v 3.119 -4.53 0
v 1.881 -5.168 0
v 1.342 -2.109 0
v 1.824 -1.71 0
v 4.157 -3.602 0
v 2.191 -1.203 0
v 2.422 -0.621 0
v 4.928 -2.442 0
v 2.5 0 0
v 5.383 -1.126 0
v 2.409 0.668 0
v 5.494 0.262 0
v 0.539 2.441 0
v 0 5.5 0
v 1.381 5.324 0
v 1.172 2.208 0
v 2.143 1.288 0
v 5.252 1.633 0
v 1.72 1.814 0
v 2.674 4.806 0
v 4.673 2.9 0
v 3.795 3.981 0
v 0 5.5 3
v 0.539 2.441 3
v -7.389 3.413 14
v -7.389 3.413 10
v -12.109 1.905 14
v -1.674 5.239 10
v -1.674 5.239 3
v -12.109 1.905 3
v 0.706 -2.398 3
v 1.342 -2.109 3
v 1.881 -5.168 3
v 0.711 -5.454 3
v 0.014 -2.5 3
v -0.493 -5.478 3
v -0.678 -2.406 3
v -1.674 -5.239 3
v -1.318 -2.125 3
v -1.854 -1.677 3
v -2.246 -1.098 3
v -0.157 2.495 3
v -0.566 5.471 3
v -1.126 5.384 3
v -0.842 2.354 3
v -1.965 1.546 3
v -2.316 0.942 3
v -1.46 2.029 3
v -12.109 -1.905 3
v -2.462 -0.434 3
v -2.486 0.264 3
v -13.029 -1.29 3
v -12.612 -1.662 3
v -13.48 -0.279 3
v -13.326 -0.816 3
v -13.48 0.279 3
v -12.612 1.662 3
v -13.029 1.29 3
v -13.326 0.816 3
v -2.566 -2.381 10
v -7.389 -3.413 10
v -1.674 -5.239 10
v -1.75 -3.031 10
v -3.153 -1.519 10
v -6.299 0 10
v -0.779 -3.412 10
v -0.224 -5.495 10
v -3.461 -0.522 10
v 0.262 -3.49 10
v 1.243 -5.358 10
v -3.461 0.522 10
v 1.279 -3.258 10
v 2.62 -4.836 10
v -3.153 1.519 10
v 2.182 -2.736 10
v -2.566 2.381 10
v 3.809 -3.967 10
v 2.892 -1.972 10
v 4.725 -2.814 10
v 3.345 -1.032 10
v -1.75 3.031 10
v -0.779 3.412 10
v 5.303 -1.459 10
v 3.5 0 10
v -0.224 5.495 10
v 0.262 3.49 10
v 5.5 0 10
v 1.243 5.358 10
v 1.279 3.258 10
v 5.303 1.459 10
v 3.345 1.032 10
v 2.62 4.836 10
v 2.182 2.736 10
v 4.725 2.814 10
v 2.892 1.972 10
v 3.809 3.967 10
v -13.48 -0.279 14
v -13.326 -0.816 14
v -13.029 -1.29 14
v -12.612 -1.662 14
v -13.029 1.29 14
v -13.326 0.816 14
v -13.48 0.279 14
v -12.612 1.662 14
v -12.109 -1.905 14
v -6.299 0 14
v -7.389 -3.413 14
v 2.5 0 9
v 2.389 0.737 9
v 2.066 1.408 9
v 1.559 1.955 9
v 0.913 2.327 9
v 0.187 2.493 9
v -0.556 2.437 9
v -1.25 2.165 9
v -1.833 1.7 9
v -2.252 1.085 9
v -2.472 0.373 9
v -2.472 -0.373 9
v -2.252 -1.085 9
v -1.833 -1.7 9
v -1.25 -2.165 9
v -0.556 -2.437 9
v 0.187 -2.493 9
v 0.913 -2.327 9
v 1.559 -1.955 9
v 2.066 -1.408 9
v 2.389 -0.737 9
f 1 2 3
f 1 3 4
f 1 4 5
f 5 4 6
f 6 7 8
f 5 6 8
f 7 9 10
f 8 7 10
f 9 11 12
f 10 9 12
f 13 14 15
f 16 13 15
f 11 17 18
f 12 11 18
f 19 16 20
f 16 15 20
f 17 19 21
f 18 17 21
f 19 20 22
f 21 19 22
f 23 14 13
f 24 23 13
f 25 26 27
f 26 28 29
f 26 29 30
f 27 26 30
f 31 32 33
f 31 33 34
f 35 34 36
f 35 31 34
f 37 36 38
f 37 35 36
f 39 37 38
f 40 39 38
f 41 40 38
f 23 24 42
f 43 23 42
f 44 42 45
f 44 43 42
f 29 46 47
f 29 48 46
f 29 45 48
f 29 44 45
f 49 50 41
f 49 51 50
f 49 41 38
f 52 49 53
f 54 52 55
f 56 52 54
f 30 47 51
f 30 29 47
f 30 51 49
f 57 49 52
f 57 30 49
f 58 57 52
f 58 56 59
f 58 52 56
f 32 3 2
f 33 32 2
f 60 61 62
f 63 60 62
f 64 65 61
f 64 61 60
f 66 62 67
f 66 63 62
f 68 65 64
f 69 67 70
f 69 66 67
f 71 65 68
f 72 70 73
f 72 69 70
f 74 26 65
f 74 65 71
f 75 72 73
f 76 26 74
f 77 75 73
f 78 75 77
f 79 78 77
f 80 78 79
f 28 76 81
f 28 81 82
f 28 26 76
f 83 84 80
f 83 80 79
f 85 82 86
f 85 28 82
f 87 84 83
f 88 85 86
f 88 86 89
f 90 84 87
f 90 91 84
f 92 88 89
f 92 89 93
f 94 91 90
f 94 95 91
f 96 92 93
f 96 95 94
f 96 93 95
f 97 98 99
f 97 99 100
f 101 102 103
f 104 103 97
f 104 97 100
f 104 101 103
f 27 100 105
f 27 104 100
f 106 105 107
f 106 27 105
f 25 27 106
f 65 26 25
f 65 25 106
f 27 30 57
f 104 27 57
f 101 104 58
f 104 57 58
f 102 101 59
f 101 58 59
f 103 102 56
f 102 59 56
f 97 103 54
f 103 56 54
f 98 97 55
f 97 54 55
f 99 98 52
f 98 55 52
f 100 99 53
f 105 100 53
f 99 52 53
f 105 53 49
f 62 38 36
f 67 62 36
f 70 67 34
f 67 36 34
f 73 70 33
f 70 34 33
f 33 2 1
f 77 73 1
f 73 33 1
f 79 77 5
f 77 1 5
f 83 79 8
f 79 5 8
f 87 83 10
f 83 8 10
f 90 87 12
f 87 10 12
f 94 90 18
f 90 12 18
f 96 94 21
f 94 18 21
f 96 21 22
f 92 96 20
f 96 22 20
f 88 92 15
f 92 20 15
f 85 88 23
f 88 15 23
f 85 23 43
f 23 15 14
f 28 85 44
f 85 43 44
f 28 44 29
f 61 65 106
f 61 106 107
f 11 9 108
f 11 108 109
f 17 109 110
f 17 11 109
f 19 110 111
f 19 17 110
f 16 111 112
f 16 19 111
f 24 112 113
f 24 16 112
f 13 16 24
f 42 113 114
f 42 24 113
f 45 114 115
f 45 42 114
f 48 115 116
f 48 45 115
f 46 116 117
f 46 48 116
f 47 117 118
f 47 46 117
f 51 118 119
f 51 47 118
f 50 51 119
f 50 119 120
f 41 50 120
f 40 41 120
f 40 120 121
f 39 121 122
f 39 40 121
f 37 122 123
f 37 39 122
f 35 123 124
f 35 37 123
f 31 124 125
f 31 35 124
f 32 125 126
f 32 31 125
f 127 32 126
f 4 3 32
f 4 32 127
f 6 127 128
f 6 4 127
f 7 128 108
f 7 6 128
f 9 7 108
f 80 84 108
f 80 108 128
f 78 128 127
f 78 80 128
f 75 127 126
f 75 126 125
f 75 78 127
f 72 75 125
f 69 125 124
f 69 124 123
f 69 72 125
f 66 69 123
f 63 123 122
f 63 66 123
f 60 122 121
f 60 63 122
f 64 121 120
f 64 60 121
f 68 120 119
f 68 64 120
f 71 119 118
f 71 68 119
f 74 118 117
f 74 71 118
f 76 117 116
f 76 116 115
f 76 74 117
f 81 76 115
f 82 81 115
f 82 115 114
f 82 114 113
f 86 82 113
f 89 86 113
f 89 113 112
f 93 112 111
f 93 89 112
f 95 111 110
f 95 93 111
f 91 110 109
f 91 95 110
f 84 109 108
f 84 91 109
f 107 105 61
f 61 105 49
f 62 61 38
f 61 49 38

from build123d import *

# Parameters (mm, degrees)
ESQUISSE1_R             = 2.5
EXTRUSION1_DEPTH        = 14
ENL_V_MAT_EXTRU_1_DEPTH = 4
ESQUISSE4_R             = 2.5
ENL_V_MAT_EXTRU_2_DEPTH = 3
CHANFREIN1_SIZE         = 1


with BuildPart() as part:
    # Esquisse1 → Extrusion1 (new body)
    with BuildSketch(Plane.XY):
        with BuildLine():
            Line((-1.673913043, 5.239085333), (-12.108695652, 1.905121939))
            ThreePointArc((-12.108695652, 1.905121939), (-13.5, 0), (-12.108695652, -1.905121939))
            Line((-12.108695652, -1.905121939), (-1.673913043, -5.239085333))
            ThreePointArc((-1.673913043, -5.239085333), (5.5, 0), (-1.673913043, 5.239085333))
        make_face()
        Circle(ESQUISSE1_R, mode=Mode.SUBTRACT)
    extrude(amount=EXTRUSION1_DEPTH)

    # Esquisse2 → Enlèv. mat.-Extru.1 (cut)
    with BuildSketch(Plane.XY.offset(14)):
        with BuildLine():
            Line((-1.673913043, 5.239085333), (-7.389278861, 3.412998376))
            Line((-7.389278861, 3.412998376), (-6.298809411, 0))
            Line((-6.298809411, 0), (-7.389278861, -3.412998376))
            Line((-7.389278861, -3.412998376), (-1.673913043, -5.239085333))
            ThreePointArc((-1.673913043, -5.239085333), (5.5, 0), (-1.673913043, 5.239085333))
        make_face()
    extrude(amount=-ENL_V_MAT_EXTRU_1_DEPTH, mode=Mode.SUBTRACT)

    # Esquisse4 → Enlèv. mat.-Extru.2 (cut)
    with BuildSketch(Plane(origin=(0, 0, 0), x_dir=(-1, 0, 0), z_dir=(0, 0, -1))):
        Circle(ESQUISSE4_R)
        with BuildLine():
            Line((1.673913043, -5.239085333), (12.108695652, -1.905121939))
            ThreePointArc((12.108695652, -1.905121939), (13.5, 0), (12.108695652, 1.905121939))
            Line((12.108695652, 1.905121939), (1.673913043, 5.239085333))
            ThreePointArc((1.673913043, 5.239085333), (0.847062769, 5.434379879), (0, 5.5))
            Line((0, 5.5), (-1.881110788, -5.168309414))
            ThreePointArc((-1.881110788, -5.168309414), (-0.10947618, -5.498910344), (1.673913043, -5.239085333))
        make_face()
    extrude(amount=-ENL_V_MAT_EXTRU_2_DEPTH, mode=Mode.SUBTRACT)

    # Chanfrein1
    chanfrein1_edges = [part.edges().sort_by_distance(p)[0] for p in [
        (-2.5, 0, 10),
    ]]
    chamfer(chanfrein1_edges, length=CHANFREIN1_SIZE)


solid = part.part
